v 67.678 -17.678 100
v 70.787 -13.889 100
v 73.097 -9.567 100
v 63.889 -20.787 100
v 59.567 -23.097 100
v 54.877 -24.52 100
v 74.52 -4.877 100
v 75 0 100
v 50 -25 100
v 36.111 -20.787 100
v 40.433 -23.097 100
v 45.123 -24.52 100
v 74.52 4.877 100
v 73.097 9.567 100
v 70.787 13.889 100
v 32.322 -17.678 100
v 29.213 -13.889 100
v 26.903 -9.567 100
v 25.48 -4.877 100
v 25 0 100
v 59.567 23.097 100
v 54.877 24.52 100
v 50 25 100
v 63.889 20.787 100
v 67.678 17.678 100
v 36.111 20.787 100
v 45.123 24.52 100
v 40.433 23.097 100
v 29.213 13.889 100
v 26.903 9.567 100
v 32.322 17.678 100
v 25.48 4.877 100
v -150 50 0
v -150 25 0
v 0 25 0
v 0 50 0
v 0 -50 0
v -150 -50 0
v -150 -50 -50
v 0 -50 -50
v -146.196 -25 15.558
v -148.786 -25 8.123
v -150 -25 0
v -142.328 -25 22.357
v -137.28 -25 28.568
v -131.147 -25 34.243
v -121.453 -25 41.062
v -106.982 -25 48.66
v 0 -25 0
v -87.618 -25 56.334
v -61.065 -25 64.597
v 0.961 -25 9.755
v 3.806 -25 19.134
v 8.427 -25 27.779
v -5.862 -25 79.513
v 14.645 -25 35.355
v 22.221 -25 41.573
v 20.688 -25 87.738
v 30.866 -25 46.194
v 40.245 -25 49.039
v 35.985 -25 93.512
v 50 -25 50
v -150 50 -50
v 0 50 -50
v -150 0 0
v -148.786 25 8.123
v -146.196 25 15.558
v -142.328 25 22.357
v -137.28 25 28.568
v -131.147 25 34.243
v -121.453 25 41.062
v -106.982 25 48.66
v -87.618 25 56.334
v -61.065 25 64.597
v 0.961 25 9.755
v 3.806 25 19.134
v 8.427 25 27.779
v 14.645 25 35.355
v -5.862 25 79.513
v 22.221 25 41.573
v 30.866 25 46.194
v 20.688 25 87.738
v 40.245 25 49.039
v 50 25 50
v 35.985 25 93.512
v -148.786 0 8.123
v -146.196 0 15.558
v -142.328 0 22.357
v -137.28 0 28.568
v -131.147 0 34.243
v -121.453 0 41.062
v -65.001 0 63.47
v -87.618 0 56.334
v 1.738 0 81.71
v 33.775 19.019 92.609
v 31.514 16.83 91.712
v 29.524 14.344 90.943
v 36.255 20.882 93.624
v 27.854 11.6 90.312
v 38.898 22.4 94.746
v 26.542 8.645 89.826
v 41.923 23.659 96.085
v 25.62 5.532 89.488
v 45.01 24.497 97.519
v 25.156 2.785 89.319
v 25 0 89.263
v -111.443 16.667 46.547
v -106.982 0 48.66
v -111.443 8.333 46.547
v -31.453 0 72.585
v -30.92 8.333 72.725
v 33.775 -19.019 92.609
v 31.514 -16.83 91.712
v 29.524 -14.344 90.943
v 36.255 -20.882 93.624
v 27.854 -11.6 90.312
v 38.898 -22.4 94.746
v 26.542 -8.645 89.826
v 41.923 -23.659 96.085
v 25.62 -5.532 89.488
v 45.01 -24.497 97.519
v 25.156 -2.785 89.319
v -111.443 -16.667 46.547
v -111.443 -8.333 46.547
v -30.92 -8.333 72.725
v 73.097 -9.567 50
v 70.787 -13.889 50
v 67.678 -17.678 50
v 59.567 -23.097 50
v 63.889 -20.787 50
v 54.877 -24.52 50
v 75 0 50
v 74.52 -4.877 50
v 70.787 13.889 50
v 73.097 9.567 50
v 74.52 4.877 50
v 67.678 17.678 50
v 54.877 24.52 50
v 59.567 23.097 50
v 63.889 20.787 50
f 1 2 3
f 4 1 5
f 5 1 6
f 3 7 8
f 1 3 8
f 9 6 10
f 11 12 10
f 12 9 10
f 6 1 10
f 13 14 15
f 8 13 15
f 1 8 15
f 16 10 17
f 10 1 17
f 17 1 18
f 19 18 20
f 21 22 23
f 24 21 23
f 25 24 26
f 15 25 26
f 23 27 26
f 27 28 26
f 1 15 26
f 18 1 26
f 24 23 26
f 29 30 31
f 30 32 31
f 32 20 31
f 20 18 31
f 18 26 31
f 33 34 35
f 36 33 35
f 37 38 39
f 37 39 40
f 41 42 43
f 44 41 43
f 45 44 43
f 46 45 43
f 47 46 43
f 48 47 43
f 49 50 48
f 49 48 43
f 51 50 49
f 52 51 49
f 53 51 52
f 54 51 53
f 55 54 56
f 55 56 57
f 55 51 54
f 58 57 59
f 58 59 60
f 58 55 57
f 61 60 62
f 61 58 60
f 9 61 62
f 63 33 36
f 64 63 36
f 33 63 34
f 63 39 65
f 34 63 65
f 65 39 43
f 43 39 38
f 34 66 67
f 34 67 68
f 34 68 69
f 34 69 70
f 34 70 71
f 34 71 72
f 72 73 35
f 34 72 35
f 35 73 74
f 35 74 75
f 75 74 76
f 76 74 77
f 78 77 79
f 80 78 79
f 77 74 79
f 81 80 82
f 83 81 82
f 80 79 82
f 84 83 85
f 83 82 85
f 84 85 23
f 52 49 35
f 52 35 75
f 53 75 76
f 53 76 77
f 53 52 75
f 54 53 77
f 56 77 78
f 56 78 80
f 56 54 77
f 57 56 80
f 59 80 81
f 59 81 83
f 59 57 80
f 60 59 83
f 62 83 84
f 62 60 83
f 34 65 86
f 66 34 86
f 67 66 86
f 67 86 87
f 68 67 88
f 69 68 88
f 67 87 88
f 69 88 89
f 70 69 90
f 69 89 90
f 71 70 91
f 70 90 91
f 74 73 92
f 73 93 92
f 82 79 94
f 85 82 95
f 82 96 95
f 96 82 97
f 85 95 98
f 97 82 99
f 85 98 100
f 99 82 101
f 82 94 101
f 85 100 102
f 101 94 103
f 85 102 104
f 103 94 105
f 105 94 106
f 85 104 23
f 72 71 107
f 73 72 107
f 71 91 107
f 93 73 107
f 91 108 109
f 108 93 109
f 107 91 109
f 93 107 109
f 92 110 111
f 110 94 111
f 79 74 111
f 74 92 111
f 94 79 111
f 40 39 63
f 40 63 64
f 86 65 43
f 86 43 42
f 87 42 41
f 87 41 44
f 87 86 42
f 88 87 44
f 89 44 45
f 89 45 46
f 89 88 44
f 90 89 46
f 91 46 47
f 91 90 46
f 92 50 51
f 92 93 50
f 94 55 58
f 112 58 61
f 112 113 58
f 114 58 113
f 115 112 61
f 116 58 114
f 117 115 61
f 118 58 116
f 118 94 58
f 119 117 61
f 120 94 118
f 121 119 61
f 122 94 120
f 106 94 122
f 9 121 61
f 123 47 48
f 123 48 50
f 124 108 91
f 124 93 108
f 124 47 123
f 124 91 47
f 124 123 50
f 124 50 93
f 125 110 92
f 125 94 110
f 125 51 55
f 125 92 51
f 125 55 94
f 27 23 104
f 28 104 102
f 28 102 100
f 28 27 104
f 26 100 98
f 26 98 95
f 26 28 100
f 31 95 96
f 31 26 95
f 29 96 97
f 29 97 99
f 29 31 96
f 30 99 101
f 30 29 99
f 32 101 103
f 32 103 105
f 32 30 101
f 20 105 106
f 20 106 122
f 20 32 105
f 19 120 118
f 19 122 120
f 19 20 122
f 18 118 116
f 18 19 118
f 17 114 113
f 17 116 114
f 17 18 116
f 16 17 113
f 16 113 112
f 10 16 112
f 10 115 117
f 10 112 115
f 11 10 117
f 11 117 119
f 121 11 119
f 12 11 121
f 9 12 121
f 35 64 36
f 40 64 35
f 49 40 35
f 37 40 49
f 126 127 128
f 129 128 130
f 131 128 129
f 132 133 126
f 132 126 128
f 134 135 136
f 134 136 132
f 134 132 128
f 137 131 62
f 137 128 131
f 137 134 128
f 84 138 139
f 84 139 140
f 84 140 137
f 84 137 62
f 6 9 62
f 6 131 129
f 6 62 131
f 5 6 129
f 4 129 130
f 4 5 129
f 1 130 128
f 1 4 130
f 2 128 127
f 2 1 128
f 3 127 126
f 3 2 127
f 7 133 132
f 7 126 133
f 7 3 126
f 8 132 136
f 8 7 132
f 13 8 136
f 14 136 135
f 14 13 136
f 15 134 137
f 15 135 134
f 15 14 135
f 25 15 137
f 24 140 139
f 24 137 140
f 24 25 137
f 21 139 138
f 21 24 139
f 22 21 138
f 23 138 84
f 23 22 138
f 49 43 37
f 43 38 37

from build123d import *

# Parameters (mm, degrees)
F0_W     = 150
F0_H     = 50
F1_DEPTH = 50
F2_DEPTH = 25
F0_W_2   = 25


with BuildPart() as f1:
    # F0 (on Front) → F1 (new body, symmetric)
    with BuildSketch(Plane.XZ):
        with Locations((-75, -25)):
            Rectangle(F0_W, F0_H)
    extrude(amount=F1_DEPTH, both=True)

    # F0 (on Front) → F2 (join, symmetric)
    with BuildSketch(Plane.XZ):
        with BuildLine():
            Line((-150, 0), (0, 0))
            ThreePointArc((0, 0), (14.644661, 35.355339), (50, 50))
            Line((50, 50), (50, 100))
            add(Edge.make_bspline(
                [(-150, 0), (-146.281272, 63.885584), (-17.262463, 65.02264), (50, 100)],
                knots=[0, 0, 0, 0, 223.606798, 223.606798, 223.606798, 223.606798], degree=3))
        make_face()
    extrude(amount=F2_DEPTH, both=True)

    # F0 (on Front) → F3 (revolve)
    with BuildSketch(Plane.XZ):
        with Locations((62.5, 75)):
            Rectangle(F0_W_2, F0_H)
    revolve(axis=Axis((50, 0, 75), (0, 0, 1)))


solid = f1.part
